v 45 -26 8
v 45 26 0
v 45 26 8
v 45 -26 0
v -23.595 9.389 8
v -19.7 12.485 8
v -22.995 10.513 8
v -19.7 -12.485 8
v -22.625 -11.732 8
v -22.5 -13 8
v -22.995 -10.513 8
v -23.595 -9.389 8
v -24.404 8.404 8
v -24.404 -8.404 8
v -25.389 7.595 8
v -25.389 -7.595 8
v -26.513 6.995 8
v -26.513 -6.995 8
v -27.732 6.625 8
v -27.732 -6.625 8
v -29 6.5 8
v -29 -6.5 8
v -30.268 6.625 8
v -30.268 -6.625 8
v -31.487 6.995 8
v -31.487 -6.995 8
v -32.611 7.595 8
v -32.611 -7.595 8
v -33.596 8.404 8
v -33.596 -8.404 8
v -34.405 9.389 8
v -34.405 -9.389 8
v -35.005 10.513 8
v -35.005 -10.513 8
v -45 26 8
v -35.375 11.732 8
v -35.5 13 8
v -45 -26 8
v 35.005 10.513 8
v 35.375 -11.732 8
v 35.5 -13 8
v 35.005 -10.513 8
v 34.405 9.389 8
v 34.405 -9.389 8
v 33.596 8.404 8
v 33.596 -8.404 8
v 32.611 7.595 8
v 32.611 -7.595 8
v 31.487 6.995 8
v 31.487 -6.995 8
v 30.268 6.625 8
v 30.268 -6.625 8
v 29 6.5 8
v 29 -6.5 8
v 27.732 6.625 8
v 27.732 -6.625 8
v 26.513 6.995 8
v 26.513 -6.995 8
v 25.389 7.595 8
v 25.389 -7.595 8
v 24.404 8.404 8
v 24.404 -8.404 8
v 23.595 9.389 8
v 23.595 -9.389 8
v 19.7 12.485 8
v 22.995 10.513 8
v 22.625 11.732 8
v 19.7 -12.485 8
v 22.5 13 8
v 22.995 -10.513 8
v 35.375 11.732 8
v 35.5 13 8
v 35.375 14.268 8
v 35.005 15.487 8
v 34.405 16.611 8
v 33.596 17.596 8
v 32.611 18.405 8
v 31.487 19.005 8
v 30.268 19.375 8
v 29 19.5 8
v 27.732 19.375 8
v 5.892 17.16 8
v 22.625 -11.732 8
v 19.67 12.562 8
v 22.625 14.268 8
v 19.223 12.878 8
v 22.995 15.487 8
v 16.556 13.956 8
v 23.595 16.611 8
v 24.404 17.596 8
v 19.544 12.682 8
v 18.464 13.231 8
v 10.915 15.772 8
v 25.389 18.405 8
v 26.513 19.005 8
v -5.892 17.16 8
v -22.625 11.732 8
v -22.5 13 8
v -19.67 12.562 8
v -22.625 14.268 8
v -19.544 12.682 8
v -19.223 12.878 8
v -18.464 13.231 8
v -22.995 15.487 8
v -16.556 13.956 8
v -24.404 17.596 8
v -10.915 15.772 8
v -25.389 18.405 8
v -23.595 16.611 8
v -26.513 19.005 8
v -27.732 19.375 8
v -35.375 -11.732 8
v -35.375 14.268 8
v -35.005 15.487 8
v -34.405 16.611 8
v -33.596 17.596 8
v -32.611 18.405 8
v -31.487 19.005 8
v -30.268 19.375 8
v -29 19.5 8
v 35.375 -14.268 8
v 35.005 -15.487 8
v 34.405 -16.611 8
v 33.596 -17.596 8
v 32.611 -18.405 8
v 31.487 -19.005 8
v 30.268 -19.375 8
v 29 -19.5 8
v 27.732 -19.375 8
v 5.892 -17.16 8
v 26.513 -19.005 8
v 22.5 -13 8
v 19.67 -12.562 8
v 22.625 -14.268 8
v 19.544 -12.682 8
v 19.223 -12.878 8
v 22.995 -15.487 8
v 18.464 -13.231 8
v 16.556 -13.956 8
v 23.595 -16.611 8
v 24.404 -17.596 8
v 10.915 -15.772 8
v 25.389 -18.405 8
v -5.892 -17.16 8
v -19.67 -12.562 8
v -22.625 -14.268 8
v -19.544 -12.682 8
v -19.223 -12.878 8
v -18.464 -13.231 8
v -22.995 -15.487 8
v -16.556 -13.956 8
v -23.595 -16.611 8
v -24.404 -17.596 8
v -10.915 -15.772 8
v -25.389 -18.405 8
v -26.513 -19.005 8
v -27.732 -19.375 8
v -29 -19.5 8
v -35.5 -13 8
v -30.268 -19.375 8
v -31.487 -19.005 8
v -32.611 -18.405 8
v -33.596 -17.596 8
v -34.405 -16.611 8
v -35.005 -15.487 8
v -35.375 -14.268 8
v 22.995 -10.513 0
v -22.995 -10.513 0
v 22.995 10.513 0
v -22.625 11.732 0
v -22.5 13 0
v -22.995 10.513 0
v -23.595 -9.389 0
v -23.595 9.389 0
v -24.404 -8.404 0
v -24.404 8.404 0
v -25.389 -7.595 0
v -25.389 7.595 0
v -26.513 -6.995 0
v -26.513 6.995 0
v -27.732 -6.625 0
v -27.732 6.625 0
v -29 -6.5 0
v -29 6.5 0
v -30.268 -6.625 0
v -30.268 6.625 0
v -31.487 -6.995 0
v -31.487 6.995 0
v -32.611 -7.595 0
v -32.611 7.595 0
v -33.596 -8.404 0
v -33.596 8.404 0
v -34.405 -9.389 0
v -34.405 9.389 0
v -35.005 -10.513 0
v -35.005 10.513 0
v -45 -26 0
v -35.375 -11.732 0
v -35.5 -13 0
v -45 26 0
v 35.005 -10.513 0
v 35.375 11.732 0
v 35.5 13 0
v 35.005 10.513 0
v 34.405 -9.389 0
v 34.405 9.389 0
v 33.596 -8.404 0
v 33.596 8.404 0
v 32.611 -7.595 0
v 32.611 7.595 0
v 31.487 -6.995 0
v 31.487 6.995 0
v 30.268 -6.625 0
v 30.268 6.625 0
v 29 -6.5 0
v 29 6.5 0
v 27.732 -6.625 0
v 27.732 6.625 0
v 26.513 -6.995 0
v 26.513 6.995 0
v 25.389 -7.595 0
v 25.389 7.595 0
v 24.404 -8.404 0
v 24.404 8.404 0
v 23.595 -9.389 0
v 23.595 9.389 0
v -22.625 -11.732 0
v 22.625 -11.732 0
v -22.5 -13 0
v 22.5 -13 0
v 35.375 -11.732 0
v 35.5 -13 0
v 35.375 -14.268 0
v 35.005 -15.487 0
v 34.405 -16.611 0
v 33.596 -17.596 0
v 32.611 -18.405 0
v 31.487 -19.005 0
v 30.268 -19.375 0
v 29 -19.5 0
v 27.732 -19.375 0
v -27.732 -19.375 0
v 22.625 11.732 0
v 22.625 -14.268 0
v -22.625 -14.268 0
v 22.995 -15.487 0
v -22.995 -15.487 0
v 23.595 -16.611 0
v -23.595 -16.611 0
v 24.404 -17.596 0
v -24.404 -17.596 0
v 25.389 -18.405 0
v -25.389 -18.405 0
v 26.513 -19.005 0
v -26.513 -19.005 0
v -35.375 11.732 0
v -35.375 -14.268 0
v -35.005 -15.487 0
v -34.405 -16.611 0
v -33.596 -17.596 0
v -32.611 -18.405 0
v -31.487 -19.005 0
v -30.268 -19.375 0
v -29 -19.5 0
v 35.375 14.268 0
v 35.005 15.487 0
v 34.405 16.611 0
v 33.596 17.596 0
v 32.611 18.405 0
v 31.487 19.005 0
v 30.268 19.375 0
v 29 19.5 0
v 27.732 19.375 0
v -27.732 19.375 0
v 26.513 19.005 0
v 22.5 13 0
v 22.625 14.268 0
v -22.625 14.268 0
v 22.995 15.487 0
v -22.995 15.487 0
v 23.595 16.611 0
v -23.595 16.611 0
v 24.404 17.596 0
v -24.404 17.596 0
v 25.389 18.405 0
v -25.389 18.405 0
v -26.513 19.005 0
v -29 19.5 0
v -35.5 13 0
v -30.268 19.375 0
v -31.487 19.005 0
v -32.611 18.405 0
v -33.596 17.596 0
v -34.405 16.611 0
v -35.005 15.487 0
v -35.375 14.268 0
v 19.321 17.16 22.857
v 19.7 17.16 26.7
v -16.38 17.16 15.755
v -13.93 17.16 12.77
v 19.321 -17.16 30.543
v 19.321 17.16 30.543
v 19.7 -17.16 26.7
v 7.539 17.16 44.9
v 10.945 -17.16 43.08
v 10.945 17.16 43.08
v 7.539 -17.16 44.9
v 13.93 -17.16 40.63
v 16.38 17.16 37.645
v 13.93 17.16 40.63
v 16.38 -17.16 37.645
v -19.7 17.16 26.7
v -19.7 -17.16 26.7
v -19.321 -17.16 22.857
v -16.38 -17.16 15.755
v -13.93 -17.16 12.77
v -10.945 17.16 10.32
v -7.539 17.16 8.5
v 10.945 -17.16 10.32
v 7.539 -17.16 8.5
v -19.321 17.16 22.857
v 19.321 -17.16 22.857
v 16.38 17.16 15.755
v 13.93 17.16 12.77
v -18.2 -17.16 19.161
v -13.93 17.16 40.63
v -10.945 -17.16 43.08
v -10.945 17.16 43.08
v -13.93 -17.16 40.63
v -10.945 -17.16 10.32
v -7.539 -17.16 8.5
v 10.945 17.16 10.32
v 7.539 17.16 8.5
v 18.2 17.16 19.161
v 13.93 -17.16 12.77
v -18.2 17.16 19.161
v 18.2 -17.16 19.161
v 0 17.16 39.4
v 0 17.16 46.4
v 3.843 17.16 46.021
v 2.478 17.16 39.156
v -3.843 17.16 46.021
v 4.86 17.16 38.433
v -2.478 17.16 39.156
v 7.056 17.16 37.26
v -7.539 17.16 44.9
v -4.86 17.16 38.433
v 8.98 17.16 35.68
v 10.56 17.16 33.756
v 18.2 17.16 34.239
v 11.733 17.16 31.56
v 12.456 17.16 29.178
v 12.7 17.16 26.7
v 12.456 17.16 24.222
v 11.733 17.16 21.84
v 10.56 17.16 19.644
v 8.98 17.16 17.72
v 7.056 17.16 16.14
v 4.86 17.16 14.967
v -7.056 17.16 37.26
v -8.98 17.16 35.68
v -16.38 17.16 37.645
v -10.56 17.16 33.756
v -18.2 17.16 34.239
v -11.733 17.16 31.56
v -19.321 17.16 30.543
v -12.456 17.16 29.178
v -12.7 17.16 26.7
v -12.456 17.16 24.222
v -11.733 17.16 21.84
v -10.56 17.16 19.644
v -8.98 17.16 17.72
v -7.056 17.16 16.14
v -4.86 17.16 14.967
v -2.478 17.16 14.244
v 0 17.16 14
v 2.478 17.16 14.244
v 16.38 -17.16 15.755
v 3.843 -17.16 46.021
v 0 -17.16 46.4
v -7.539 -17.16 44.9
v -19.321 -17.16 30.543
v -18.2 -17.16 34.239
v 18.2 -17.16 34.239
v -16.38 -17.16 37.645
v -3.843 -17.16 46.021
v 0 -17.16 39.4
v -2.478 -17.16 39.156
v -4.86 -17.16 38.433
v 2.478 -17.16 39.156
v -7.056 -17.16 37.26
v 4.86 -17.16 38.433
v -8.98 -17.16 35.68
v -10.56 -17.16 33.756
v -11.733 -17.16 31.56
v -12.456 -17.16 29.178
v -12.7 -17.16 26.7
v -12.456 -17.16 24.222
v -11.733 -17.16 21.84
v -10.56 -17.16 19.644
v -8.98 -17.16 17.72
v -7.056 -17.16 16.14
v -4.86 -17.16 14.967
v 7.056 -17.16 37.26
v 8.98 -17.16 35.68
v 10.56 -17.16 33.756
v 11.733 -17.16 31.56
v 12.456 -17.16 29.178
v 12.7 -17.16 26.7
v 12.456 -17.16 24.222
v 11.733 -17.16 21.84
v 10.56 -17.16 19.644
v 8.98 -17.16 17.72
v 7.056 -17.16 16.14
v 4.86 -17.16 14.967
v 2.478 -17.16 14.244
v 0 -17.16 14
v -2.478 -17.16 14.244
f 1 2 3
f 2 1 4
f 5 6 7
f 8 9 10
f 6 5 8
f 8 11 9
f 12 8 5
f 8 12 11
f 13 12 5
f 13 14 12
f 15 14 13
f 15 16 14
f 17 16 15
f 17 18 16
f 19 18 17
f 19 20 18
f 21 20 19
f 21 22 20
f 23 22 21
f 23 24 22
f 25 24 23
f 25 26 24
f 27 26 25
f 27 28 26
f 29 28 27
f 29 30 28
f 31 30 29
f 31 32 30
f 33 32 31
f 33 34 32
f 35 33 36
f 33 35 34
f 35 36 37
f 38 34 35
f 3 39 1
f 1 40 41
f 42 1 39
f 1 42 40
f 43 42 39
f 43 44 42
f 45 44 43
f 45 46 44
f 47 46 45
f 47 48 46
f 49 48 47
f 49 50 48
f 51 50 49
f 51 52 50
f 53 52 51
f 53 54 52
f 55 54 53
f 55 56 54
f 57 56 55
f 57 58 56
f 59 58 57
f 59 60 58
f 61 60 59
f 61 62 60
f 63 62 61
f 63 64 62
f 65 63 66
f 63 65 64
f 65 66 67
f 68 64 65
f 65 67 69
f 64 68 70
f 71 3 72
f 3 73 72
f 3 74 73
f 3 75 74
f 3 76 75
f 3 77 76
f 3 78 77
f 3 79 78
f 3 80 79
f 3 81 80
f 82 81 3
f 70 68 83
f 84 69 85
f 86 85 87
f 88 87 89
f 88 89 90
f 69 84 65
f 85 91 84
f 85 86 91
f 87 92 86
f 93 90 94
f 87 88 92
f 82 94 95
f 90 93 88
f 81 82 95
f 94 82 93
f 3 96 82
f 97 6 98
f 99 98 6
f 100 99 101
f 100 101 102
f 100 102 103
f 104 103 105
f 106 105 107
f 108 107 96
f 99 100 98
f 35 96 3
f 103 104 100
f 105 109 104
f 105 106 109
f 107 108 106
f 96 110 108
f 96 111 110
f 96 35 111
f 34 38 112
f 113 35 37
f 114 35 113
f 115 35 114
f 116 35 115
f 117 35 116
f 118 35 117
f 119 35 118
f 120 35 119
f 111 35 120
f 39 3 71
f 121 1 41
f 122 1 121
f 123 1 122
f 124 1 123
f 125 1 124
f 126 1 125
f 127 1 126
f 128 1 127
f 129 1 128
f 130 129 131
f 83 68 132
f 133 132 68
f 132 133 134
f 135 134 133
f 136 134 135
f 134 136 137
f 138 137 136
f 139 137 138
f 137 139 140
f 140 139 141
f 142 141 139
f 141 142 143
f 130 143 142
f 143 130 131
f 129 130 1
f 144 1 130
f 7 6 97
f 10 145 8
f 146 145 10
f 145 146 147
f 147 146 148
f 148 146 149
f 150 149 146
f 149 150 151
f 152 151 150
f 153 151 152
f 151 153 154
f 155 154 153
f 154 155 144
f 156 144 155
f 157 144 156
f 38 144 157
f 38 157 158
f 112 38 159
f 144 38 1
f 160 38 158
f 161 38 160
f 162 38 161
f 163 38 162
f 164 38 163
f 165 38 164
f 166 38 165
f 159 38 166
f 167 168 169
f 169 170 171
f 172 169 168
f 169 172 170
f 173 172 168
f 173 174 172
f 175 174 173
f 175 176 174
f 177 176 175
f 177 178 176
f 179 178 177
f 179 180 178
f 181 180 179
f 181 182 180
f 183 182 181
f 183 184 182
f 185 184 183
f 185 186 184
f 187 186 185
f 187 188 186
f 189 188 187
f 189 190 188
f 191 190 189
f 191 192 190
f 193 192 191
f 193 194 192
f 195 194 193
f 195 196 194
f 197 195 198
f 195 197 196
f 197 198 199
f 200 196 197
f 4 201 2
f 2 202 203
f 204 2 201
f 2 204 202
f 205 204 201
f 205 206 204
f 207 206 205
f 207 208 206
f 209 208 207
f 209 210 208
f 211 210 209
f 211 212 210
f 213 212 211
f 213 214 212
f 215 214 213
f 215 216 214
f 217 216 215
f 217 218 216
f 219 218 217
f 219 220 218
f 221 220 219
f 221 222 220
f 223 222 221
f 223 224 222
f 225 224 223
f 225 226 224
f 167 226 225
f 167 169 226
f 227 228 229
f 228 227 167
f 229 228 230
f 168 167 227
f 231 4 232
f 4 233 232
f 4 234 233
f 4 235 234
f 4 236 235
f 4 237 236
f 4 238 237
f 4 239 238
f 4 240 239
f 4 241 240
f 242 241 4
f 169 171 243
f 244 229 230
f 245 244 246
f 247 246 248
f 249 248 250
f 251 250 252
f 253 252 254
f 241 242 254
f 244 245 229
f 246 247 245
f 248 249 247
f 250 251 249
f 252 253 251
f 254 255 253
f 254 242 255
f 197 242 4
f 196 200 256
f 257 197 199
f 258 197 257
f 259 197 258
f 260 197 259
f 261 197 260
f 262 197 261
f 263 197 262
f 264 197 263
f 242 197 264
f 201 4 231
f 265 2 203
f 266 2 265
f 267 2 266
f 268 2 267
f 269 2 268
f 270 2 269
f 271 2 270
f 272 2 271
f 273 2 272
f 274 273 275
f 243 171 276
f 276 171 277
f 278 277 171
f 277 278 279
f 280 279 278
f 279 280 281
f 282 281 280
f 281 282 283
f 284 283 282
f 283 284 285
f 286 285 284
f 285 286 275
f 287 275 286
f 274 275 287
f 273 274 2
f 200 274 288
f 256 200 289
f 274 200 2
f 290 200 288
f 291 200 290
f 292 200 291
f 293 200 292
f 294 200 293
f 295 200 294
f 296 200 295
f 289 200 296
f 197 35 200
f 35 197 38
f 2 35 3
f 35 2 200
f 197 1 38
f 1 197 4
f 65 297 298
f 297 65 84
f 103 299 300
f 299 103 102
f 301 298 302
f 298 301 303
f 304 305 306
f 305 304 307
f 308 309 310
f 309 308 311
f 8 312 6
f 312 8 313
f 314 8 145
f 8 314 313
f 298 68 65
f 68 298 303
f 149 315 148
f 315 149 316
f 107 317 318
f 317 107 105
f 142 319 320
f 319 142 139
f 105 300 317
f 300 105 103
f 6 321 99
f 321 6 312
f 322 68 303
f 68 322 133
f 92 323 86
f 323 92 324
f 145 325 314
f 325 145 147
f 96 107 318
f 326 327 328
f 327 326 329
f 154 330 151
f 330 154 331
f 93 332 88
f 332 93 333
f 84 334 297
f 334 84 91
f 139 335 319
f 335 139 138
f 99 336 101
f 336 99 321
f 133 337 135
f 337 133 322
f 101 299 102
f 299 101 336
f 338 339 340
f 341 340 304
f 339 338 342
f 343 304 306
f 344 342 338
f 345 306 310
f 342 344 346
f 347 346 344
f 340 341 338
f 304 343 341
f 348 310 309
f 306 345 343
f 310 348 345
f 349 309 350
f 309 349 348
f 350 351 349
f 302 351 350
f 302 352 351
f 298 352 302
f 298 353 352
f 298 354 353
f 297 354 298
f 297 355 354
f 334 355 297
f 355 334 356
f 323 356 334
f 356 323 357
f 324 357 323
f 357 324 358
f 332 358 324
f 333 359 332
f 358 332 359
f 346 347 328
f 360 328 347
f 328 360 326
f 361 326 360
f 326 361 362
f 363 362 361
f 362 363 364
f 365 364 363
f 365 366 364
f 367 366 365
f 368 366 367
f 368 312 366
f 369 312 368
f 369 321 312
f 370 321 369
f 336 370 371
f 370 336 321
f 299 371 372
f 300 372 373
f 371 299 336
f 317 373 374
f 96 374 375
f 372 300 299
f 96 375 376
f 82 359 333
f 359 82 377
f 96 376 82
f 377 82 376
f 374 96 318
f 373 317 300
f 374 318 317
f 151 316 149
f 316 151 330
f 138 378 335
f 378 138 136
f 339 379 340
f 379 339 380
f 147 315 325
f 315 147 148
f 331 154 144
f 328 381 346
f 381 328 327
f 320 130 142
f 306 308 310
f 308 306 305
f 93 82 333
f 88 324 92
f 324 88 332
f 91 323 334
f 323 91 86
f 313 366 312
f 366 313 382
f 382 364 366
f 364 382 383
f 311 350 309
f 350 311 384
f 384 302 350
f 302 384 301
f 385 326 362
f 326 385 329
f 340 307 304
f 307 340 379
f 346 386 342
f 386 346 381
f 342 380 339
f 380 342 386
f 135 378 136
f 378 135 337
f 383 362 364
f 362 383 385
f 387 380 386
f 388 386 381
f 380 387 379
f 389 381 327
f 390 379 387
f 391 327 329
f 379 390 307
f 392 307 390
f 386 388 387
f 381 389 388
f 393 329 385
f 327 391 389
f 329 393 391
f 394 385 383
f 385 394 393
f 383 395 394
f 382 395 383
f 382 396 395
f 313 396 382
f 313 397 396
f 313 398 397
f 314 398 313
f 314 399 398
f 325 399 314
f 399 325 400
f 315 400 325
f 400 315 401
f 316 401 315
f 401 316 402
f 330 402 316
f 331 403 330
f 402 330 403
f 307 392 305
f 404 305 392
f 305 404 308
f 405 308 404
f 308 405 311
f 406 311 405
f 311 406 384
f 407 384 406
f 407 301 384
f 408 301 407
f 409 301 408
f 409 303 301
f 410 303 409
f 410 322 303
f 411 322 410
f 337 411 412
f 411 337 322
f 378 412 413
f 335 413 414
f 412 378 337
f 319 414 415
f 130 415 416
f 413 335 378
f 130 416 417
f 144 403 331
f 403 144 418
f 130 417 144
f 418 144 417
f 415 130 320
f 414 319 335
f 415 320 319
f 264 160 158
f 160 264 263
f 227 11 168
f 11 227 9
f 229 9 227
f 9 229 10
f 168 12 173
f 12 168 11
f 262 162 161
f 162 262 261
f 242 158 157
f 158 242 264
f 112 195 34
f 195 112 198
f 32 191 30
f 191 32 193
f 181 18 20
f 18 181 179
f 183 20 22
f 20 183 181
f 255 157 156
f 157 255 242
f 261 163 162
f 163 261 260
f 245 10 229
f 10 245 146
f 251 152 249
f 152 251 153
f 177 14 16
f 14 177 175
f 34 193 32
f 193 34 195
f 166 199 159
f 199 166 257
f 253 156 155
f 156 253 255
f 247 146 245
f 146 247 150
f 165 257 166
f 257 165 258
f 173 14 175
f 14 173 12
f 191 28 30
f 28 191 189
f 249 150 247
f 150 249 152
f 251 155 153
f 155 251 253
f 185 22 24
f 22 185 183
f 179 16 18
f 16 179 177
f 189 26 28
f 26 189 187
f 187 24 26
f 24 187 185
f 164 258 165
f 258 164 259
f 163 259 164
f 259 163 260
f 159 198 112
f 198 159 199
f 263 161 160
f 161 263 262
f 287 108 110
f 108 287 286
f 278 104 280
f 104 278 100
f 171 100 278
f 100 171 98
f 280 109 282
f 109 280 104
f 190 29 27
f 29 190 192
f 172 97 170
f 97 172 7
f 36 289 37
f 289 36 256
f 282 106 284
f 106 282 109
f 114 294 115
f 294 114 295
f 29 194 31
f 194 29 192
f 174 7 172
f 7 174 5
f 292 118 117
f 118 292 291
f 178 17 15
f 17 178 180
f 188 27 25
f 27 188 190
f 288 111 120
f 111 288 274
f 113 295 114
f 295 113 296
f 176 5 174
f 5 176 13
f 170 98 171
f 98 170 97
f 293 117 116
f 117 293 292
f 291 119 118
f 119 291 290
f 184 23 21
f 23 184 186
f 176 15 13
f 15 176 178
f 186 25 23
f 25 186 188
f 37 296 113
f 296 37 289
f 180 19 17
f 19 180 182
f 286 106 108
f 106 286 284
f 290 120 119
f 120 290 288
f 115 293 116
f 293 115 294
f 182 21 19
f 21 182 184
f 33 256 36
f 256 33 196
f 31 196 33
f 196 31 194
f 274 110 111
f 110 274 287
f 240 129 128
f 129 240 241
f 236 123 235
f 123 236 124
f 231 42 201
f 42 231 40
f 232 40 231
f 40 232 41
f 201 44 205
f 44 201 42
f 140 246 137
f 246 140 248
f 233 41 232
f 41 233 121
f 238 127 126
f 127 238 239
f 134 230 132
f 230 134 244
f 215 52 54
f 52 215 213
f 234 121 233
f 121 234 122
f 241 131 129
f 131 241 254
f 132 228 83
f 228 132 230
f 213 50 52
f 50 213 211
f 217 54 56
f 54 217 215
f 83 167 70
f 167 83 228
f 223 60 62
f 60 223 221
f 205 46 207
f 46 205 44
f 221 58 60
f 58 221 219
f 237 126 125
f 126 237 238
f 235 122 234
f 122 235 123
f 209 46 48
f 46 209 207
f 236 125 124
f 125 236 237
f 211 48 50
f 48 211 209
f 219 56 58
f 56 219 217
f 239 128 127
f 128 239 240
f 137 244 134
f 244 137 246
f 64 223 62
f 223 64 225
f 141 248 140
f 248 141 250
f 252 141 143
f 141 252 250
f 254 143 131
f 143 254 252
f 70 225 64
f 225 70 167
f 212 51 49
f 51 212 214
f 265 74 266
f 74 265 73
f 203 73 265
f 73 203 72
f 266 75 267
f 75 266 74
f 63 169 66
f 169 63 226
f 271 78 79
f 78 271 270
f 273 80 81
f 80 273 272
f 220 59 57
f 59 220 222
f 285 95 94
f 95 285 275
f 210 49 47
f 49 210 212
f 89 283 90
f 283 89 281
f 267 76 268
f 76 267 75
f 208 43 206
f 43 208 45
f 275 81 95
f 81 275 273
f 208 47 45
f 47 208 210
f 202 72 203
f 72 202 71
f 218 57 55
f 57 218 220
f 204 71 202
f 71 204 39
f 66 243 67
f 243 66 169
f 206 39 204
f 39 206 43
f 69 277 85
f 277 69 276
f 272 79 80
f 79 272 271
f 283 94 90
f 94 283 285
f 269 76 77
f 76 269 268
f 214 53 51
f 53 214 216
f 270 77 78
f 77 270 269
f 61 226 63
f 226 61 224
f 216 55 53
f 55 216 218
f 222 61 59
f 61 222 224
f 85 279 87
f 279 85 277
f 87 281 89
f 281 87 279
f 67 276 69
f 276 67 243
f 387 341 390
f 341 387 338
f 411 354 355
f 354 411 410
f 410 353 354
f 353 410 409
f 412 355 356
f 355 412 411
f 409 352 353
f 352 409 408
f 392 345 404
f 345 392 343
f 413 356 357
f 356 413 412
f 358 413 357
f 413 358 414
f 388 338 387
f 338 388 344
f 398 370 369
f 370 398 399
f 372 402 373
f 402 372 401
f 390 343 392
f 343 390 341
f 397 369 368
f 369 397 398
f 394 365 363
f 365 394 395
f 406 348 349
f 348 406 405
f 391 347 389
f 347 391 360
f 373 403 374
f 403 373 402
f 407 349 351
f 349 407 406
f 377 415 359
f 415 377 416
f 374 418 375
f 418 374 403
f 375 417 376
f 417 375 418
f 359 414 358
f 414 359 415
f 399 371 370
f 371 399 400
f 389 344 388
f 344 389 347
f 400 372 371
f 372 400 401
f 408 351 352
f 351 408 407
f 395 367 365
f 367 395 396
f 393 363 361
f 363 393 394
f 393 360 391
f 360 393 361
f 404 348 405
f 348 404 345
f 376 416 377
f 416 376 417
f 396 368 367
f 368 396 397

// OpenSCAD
$fn = 32;

// ----------------------------------------------------------------------
// Bearing block: 90 x 52 mm base, 25.4 mm bore at 26.7 mm
// ----------------------------------------------------------------------

// --- parameters (mm) ---
base_w = 90;              // base width
base_d = 52;              // base depth
base_t = 8;               // base thickness
bore_d = 25.4;            // shaft / bearing bore
house_r = 19.7;           // housing outer radius
house_len = 34.32;        // housing length along the shaft
foot_w = 39.4;            // foot width under the housing
foot_len = 24.32;         // foot length along the shaft
axis_z = 26.7;            // bore axis height above the base
holes_d = 13;             // mounting holes
hole_x = 29;              // mounting hole spacing

difference() {
  union() {
    /* base plate with its underside on z = 0 */
    translate([0, 0, base_t / 2]) cube([base_w, base_d, base_t], center = true);
    /* hull foot: a straight web blending into the round housing */
    hull() {
      translate([0, 0, base_t - 0.5]) cube([foot_w, foot_len, 1.6], center = true);
      translate([0, 0, axis_z]) rotate([-90, 0, 0]) cylinder(h = house_len, d = 2 * house_r, center = true);
    }
  }
  /* bore through the housing, 2.5 mm clear on both sides */
  translate([0, 0, axis_z]) rotate([-90, 0, 0]) cylinder(h = house_len + 5, d = bore_d, center = true);
  /* mounting holes through the base plate */
  for (hx = [-29, 29]) {
    for (hy = [-13, 13]) {
      translate([hx, hy, -2.5]) cylinder(h = base_t + 5, d = holes_d);
    }
  }
}
